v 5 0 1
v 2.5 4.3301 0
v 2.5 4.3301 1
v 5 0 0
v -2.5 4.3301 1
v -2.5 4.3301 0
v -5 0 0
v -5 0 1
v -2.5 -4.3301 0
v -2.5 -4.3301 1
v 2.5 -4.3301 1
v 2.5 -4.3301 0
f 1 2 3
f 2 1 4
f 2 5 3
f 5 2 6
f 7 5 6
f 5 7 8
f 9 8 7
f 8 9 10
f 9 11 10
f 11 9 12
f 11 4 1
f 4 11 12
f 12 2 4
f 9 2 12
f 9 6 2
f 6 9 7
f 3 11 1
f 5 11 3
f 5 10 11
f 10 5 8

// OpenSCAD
// Lesson 3 - names hold values, not variables
//
// The lesson that saves the most time. If you know Python or Rust, OpenSCAD's
// "variables" behave like none you have used: a name is bound to ONE value in a
// scope, and nothing can change it afterwards.
//
// Every result quoted below was measured on the 2021.01 release and on a 2026
// nightly, and the two agree. Press F5 and read the CONSOLE, not the viewport.

// ---------------------------------------------------------------------------
// 1. One value per scope - the last one assigned
// ---------------------------------------------------------------------------
// Uncomment the two lines below and press F5:
// a = 1;
// a = 2;
// Console:  WARNING: a was assigned on line .. but was overwritten ...
// Every use of `a` in this scope then sees 2.

// ---------------------------------------------------------------------------
// 2. Assignments run first, in order; everything else runs after
// ---------------------------------------------------------------------------
echo(seen_before_assignment = b);    // prints 7
b = 7;
// echo() and geometry see the FINAL value of every name in the scope, wherever
// they are written. Between assignments, though, order does matter:
// `c = d + 1;` written above `d = 5;` gives c = undef and two warnings.

// ---------------------------------------------------------------------------
// 3. A for loop cannot accumulate
// ---------------------------------------------------------------------------
total = 0;
for (i = [1:3]) {
    total = total + i;
    echo(inside_loop = i, total = total);
}
echo(after_loop = total);
// Console:  inside_loop = 1, total = 1
//           inside_loop = 2, total = 2     not 3
//           inside_loop = 3, total = 3     not 6
//           after_loop = 0                 the outer total never changed
//
// Each pass of a loop body is its own scope. There, `total = total + i` reads the
// OUTER total - always 0 - and binds a new inner one that is gone when the pass
// ends. Nothing flows from one pass to the next.

// ---------------------------------------------------------------------------
// 4. What to do instead: compute the value in one expression
// ---------------------------------------------------------------------------
// A recursive function:
function sum(v, i = 0) = i >= len(v) ? 0 : v[i] + sum(v, i + 1);
echo(sum_of_1_2_3 = sum([1, 2, 3]));                 // 6

// Or build the list you need with a list comprehension, then reduce it:
squares = [for (i = [1:3]) i * i];
echo(squares = squares, their_sum = sum(squares));   // [1, 4, 9], 14

// ---------------------------------------------------------------------------
// 5. Scope: a name bound inside a module stays inside it
// ---------------------------------------------------------------------------
module part() {
    inner = 42;
    echo(inside_part = inner);
}
part();
echo(outside_part_it_is_undef = is_undef(inner));    // true

// ---------------------------------------------------------------------------
// 6. The exception: $ variables pass DOWN into what you call
// ---------------------------------------------------------------------------
// $fn, $fa, $fs, and any name you start with $, travel into every module you
// call, as though they were an extra argument.
module disc() {
    echo(fn_inside_disc = $fn);
    cylinder(h = 1, d = 10);
}
disc($fn = 6);        // a hexagon, and the console says fn_inside_disc = 6

// ---------------------------------------------------------------------------
// 7. Overriding a value from an included file is silent - and it is the idiom
// ---------------------------------------------------------------------------
// `include <file>` pastes the file into this one. Binding one of its names again
// AFTER the include replaces it with no warning (measured). The models in this
// repository rely on that: a companion file includes a model, then sets
// `draw_model = false` to borrow its numbers without its geometry.

// ---------------------------------------------------------------------------
// 8. Numbers that print the same are not always equal
// ---------------------------------------------------------------------------
echo(layers_in_0_6 = 0.6 / 0.2);                     // prints 3
echo(exactly_3 = (0.6 / 0.2 == 3));                  // false: it is 2.9999999999999996
echo(close_to_3 = (abs(0.6 / 0.2 - 3) < 1e-6));      // true
// This is why every "is this a whole number of layers?" check in the models here
// compares with a tolerance - abs(x - round(x)) < 1e-6 - and never with ==.

// ---------------------------------------------------------------------------
// 9. Conditionals and let() are expressions
// ---------------------------------------------------------------------------
wall = 2.25;
role = wall >= 1.35 ? "structural" : "cosmetic";
echo(role = role);

area = let (w = 20, h = 10) w * h;
echo(area = area);

// ---------------------------------------------------------------------------
// TRY
// ---------------------------------------------------------------------------
//  1. Uncomment section 1 and read the warning.
//  2. Make section 3's loop print the running totals 1, 3, 6.
//     Hint: inside the loop, sum a list you build fresh on each pass.
//  3. Write a recursive function that returns the largest number in a list, and
//     check it against the built-in max([3, 9, 4]).
//  4. Try other heights in section 8. Which multiples of 0.2 compare exactly?
